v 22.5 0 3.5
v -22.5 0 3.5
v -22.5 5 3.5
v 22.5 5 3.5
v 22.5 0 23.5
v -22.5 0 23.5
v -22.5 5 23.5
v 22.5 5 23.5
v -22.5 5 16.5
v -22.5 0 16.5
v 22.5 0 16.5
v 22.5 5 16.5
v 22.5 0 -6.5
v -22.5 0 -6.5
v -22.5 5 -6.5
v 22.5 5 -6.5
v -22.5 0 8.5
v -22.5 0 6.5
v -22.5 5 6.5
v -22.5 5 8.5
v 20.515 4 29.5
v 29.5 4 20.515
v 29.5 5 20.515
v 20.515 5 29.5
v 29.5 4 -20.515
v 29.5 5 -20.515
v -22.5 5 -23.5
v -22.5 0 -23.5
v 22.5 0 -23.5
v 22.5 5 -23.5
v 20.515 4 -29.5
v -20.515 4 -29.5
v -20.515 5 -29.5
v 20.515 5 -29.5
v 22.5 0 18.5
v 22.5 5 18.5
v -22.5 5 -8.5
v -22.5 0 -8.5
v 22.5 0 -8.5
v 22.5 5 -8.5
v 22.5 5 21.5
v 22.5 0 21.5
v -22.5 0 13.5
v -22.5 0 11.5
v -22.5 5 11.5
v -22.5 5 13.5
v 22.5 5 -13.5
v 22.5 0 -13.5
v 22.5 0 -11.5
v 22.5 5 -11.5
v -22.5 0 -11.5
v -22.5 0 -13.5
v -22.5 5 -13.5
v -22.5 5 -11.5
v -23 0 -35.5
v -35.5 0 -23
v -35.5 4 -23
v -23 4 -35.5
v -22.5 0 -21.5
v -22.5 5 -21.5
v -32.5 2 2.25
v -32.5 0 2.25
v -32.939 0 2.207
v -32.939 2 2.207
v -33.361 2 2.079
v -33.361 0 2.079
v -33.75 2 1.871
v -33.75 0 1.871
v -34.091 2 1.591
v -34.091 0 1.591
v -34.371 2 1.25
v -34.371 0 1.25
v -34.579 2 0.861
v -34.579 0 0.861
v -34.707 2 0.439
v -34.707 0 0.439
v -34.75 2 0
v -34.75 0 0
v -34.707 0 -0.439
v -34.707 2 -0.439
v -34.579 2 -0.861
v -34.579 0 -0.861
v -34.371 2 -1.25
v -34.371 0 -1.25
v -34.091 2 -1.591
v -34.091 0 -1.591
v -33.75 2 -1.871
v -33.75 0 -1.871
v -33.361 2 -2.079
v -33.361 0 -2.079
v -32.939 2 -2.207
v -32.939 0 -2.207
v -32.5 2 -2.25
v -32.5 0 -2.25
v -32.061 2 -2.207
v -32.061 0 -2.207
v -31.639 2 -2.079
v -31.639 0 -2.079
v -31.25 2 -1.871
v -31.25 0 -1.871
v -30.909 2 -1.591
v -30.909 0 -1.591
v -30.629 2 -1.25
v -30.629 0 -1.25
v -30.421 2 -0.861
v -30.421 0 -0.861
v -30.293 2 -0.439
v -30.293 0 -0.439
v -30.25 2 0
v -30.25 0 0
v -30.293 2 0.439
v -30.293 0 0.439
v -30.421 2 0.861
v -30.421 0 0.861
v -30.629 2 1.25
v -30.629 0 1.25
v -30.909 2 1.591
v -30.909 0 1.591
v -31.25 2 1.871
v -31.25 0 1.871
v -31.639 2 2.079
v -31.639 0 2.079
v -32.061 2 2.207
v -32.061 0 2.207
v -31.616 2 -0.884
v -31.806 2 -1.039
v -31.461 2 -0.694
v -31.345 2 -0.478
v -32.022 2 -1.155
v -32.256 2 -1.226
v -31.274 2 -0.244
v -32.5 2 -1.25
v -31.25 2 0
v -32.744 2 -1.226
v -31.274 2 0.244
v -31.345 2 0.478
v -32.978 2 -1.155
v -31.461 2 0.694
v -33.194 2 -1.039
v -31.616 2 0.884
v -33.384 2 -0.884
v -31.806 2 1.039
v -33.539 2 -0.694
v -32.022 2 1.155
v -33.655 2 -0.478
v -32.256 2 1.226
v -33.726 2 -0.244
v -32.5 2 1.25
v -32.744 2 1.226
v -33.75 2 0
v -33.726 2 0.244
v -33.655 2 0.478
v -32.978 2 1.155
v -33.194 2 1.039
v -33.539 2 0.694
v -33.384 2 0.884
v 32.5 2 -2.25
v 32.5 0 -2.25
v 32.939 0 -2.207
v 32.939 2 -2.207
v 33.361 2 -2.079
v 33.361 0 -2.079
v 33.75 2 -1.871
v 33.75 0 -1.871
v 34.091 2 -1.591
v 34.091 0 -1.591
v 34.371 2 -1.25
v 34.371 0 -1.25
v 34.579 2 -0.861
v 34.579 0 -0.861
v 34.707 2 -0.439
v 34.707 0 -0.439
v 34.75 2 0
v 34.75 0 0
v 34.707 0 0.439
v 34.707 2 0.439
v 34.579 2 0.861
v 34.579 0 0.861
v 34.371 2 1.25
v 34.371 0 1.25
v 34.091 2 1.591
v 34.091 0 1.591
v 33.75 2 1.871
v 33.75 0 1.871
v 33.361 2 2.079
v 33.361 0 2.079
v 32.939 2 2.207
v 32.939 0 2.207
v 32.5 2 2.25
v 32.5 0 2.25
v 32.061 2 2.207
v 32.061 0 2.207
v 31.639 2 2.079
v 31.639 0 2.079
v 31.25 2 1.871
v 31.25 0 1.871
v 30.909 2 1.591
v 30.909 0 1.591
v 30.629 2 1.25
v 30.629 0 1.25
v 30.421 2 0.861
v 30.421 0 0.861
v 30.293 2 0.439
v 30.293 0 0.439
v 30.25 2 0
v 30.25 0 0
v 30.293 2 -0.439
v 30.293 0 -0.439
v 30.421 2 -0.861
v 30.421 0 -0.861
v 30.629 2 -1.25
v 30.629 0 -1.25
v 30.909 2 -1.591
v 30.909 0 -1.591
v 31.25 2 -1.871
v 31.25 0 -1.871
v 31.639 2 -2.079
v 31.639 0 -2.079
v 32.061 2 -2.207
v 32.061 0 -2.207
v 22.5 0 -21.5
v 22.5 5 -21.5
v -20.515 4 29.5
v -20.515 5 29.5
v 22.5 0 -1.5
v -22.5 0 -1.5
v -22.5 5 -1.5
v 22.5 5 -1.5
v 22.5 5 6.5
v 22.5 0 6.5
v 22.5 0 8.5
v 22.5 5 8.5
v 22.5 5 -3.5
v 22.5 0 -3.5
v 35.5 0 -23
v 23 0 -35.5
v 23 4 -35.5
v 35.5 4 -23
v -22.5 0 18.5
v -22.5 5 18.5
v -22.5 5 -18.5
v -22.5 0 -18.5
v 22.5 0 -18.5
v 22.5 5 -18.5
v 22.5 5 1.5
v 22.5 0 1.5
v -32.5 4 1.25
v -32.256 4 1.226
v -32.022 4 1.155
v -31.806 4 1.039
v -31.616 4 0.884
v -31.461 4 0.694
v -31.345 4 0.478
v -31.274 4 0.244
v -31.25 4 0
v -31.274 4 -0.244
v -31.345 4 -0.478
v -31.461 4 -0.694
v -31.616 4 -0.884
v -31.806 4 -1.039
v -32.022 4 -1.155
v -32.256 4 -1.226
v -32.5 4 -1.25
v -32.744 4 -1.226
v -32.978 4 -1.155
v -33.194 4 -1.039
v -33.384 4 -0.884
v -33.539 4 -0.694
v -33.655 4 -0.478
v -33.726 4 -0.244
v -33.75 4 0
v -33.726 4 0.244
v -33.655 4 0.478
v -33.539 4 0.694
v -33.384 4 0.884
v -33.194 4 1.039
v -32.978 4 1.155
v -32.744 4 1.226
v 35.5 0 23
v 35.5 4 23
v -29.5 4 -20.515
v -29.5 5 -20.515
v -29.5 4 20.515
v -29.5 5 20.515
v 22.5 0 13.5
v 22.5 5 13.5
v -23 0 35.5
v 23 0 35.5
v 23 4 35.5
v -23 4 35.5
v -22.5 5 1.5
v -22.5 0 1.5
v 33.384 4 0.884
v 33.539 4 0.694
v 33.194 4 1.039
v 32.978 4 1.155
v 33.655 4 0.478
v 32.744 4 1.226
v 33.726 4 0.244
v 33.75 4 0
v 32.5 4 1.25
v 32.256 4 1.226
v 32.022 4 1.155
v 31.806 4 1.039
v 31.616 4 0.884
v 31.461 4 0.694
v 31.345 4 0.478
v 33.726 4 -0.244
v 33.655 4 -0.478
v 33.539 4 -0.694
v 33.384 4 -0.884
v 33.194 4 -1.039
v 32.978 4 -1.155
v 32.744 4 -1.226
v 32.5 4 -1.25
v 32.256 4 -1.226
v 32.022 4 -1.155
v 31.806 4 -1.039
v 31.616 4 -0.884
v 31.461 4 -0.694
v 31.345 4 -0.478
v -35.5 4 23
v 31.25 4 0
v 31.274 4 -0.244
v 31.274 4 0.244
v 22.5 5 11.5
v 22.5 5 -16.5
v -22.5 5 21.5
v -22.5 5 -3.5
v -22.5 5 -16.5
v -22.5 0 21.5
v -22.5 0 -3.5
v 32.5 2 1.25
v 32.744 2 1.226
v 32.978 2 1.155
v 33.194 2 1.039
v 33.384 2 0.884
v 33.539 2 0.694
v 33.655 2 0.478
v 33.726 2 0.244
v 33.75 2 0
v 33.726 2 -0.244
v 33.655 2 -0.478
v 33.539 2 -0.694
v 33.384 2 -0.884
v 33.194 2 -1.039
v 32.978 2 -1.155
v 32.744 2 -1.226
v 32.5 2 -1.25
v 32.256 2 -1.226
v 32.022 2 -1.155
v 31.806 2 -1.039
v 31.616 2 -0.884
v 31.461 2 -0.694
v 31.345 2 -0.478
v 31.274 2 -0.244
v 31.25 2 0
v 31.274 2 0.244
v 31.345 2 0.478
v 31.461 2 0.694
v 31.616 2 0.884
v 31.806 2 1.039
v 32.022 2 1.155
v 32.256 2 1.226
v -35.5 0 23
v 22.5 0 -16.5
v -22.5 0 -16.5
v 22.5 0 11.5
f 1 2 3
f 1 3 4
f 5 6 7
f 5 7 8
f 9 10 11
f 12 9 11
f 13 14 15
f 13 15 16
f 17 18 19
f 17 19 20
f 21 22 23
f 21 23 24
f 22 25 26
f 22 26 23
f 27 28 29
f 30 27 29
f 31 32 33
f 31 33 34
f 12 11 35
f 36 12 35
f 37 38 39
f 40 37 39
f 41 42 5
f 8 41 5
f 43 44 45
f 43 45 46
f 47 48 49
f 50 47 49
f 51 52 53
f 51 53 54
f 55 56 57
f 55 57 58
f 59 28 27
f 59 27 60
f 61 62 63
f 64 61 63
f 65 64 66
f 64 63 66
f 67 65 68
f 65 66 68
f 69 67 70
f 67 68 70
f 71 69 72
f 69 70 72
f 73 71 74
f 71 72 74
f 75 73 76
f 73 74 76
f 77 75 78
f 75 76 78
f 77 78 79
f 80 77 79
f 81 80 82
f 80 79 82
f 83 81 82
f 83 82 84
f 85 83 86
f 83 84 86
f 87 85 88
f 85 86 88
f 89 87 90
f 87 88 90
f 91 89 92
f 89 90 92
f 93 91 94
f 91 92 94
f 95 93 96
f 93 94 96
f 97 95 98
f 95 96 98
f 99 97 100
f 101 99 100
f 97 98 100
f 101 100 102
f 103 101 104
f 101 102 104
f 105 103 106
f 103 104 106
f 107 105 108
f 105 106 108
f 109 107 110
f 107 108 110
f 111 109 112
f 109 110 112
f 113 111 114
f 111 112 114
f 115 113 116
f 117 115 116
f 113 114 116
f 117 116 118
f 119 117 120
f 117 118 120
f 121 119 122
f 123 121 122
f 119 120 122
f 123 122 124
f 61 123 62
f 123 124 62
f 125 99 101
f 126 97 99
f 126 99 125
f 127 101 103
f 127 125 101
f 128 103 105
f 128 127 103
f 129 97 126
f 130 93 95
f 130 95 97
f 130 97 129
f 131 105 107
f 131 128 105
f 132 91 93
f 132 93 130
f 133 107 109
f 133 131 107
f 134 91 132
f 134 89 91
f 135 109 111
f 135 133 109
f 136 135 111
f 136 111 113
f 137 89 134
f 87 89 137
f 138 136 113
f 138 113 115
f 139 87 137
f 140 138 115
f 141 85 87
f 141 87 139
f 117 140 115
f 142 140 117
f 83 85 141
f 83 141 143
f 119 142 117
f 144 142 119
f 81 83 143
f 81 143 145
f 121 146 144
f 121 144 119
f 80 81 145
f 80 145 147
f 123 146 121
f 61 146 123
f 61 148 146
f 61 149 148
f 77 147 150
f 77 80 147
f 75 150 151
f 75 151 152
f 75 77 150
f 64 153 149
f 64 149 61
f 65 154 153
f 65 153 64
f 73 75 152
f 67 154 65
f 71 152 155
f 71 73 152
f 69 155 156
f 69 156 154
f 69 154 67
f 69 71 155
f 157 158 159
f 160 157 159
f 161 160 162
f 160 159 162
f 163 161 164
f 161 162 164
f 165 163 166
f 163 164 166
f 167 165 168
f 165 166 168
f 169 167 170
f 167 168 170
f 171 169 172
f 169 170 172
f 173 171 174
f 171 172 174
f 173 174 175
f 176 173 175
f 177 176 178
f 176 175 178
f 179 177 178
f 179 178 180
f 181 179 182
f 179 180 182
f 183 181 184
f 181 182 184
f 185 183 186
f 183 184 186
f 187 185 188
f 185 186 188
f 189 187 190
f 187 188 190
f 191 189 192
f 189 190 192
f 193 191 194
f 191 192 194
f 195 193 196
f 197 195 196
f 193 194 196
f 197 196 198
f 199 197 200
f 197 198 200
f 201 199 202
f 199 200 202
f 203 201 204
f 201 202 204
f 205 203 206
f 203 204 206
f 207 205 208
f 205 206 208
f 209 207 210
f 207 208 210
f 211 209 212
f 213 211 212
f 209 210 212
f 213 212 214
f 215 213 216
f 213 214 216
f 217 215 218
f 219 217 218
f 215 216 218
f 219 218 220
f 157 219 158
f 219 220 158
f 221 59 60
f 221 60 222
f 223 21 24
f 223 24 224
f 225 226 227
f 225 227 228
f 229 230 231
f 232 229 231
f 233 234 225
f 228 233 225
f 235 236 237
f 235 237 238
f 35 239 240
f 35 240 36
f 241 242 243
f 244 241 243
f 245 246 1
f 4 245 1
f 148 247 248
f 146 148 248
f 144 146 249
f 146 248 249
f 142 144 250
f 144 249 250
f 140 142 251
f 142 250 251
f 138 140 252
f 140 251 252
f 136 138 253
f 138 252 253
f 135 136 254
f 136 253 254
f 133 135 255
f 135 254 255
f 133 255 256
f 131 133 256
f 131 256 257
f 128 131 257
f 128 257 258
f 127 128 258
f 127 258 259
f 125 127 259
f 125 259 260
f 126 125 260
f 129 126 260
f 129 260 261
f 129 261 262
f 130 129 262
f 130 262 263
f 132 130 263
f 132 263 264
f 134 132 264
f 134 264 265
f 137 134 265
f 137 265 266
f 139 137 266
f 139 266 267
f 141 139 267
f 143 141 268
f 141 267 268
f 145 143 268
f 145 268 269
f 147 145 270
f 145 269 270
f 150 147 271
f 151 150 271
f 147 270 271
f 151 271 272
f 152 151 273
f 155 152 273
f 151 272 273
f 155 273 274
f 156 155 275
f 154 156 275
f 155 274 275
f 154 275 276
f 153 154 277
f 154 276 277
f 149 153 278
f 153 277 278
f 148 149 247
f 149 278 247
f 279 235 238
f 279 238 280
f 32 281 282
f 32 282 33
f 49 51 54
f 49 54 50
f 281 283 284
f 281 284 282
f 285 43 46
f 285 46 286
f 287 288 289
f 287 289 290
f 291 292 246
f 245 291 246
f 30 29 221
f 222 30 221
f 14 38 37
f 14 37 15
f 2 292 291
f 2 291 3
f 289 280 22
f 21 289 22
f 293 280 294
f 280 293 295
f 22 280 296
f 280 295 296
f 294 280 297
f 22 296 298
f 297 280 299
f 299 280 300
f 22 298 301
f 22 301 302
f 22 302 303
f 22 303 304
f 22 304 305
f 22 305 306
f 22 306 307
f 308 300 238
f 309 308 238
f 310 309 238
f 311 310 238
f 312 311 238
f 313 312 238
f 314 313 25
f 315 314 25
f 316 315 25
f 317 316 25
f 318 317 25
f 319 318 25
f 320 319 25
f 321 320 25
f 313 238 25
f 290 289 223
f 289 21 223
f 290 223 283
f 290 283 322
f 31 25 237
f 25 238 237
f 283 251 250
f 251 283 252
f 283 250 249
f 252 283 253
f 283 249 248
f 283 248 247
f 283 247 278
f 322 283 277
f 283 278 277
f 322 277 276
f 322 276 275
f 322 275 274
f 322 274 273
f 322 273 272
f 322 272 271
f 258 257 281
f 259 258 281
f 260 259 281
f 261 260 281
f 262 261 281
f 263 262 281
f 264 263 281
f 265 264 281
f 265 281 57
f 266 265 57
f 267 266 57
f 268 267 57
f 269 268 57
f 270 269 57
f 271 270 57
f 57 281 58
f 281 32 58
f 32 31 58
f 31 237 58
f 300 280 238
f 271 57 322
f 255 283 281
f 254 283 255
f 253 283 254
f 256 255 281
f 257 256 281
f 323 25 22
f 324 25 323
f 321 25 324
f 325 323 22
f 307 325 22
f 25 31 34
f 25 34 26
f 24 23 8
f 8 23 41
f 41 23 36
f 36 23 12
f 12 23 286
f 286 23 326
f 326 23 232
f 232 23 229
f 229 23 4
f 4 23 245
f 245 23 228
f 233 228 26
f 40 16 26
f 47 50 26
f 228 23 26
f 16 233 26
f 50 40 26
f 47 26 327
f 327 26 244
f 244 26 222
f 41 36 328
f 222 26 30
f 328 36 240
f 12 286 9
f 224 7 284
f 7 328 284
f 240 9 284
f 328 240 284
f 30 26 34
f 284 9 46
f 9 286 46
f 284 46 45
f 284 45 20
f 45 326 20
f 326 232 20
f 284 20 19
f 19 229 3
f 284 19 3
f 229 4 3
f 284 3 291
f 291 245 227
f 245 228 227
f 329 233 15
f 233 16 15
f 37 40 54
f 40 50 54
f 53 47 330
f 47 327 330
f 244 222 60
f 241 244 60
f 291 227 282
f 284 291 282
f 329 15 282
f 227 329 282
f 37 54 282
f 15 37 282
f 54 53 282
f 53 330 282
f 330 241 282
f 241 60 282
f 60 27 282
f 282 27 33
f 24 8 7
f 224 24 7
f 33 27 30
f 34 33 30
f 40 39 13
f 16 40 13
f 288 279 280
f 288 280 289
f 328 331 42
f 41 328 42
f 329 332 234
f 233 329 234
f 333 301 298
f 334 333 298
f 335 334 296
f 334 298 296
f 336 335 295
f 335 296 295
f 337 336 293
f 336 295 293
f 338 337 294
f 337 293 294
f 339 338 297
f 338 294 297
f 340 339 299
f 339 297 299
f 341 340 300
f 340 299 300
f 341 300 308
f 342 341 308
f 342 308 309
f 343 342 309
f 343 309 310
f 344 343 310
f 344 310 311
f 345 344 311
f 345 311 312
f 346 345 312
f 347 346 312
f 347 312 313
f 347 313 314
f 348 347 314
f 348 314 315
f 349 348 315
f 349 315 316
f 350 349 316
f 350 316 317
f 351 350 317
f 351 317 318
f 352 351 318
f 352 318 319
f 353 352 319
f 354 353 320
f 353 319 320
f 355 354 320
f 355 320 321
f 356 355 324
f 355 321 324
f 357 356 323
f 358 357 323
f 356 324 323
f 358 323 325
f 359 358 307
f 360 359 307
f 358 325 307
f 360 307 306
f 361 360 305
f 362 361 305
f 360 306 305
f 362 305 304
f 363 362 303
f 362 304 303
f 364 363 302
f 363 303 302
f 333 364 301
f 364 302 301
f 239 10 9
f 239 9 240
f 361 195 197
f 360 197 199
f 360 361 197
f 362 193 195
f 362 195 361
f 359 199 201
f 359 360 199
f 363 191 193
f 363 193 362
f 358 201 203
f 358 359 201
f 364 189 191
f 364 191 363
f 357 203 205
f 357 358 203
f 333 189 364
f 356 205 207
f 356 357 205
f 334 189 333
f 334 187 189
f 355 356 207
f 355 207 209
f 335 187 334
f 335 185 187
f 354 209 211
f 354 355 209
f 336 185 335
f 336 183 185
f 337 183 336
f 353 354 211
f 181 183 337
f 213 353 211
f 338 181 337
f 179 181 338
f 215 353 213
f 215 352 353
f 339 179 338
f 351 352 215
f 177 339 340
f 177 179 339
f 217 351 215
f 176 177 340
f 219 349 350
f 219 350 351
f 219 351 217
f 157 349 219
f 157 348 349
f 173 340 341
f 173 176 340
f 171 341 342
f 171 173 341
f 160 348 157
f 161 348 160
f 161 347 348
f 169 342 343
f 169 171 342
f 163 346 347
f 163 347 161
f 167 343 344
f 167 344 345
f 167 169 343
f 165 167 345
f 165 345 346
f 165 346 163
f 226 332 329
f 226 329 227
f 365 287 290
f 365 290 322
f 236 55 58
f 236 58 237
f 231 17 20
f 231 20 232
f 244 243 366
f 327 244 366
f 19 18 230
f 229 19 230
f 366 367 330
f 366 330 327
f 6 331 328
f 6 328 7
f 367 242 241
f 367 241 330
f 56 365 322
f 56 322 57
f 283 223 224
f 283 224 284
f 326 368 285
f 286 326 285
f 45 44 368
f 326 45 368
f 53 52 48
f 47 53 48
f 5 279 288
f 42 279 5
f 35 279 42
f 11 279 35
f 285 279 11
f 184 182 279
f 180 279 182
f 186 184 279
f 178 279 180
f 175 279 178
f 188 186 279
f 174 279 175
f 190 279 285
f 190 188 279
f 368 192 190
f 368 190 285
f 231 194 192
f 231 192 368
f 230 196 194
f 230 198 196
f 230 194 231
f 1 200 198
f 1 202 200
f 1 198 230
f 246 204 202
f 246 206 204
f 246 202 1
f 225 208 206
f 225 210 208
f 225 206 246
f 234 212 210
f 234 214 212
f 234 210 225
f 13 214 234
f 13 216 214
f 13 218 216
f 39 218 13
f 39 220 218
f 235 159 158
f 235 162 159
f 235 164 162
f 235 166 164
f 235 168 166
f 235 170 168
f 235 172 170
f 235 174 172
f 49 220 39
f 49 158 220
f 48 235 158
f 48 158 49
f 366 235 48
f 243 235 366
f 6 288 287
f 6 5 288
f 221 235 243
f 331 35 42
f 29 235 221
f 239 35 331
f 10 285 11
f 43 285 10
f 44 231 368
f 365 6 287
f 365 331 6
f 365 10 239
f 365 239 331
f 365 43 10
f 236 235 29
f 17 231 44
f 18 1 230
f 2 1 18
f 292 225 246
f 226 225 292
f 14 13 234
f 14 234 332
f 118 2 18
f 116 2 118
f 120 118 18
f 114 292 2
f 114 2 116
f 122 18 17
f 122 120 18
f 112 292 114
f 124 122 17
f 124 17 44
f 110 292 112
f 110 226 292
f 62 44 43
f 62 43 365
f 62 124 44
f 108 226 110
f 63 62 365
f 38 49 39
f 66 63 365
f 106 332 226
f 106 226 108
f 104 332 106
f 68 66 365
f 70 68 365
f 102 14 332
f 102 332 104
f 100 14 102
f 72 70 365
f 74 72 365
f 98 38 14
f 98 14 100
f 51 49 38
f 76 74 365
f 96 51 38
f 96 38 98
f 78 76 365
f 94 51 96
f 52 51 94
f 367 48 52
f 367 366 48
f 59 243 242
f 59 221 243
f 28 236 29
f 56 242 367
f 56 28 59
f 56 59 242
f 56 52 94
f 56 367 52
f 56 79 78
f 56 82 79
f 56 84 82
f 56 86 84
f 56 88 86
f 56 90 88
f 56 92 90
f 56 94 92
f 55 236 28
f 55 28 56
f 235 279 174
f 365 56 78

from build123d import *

# Parameters (mm, degrees)
BOSS_EXTRUDE1_DEPTH = 4
BOSS_EXTRUDE3_START = 4
BOSS_EXTRUDE3_DEPTH = 1
CUT_EXTRUDE2_REACH  = 52.364
SKETCH5_R           = 1.25
SKETCH6_R           = 2.25
CUT_EXTRUDE3_DEPTH  = 2
SKETCH7_W           = 45
SKETCH7_H           = 2
CUT_EXTRUDE4_DEPTH  = 10


with BuildPart() as part:
    # Sketch1 → Boss-Extrude1 (new body)
    with BuildSketch(Plane(origin=(0, 0, 0), x_dir=(1, 0, 0), z_dir=(0, 1, 0))):
        Polygon((-35.5, 23), (-23, 35.5), (23, 35.5), (35.5, 23), (35.5, -23), (23, -35.5), (-23, -35.5), (-35.5, -23), align=None)
    extrude(amount=BOSS_EXTRUDE1_DEPTH)

    # Sketch3 → Boss-Extrude3 (add)
    with BuildSketch(Plane(origin=(0, 0, 0), x_dir=(1, 0, 0), z_dir=(0, 1, 0)).offset(BOSS_EXTRUDE3_START)):
        Polygon((-29.5, 20.514718626), (-20.514718626, 29.5), (20.514718626, 29.5), (29.5, 20.514718626), (29.5, -20.514718626), (20.514718626, -29.5), (-20.514718626, -29.5), (-29.5, -20.514718626), align=None)
    extrude(amount=BOSS_EXTRUDE3_DEPTH)

    # Sketch5 → Cut-Extrude2 (cut, up to next)
    with BuildSketch(Plane(origin=(0, 4, 0), x_dir=(1, 0, 0), z_dir=(0, 1, 0)), mode=Mode.PRIVATE) as cut_extrude2_sk1:
        with Locations(Location((32.5, 0, 0), (0, 0, 270))):
            Circle(SKETCH5_R)
    cut_extrude2_tool1 = extrude(cut_extrude2_sk1.sketch, amount=-CUT_EXTRUDE2_REACH, mode=Mode.PRIVATE) & part.part
    # Sketch5 → Cut-Extrude2 (cut, up to next)
    with BuildSketch(Plane(origin=(0, 4, 0), x_dir=(1, 0, 0), z_dir=(0, 1, 0)), mode=Mode.PRIVATE) as cut_extrude2_sk2:
        with Locations(Location((-32.5, 0, 0), (0, 0, 270))):
            Circle(SKETCH5_R)
    cut_extrude2_tool2 = extrude(cut_extrude2_sk2.sketch, amount=-CUT_EXTRUDE2_REACH, mode=Mode.PRIVATE) & part.part
    add(cut_extrude2_tool1.solids().sort_by_distance((32.5, 4, 0))[0], mode=Mode.SUBTRACT)
    add(cut_extrude2_tool2.solids().sort_by_distance((-32.5, 4, 0))[0], mode=Mode.SUBTRACT)

    # Sketch6 → Cut-Extrude3 (cut)
    with BuildSketch(Plane.XZ):
        with Locations(Location((32.5, 0, 0), (0, 0, 270))):
            Circle(SKETCH6_R)
        with Locations(Location((-32.5, 0, 0), (0, 0, 90))):
            Circle(SKETCH6_R)
    extrude(amount=-CUT_EXTRUDE3_DEPTH, mode=Mode.SUBTRACT)

    # Sketch7 → Cut-Extrude4 (cut)
    with BuildSketch(Plane.XZ):
        with Locations((0, 22.5)):
            Rectangle(SKETCH7_W, SKETCH7_H)
        with Locations((0, 17.5)):
            Rectangle(SKETCH7_W, SKETCH7_H)
        with Locations((0, 12.5)):
            Rectangle(SKETCH7_W, SKETCH7_H)
        with Locations((0, 7.5)):
            Rectangle(SKETCH7_W, SKETCH7_H)
        with Locations((0, 2.5)):
            Rectangle(SKETCH7_W, SKETCH7_H)
        with Locations((0, -2.5)):
            Rectangle(SKETCH7_W, SKETCH7_H)
        with Locations((0, -7.5)):
            Rectangle(SKETCH7_W, SKETCH7_H)
        with Locations((0, -12.5)):
            Rectangle(SKETCH7_W, SKETCH7_H)
        with Locations((0, -17.5)):
            Rectangle(SKETCH7_W, SKETCH7_H)
        with Locations((0, -22.5)):
            Rectangle(SKETCH7_W, SKETCH7_H)
    extrude(amount=-CUT_EXTRUDE4_DEPTH, mode=Mode.SUBTRACT)


solid = part.part
